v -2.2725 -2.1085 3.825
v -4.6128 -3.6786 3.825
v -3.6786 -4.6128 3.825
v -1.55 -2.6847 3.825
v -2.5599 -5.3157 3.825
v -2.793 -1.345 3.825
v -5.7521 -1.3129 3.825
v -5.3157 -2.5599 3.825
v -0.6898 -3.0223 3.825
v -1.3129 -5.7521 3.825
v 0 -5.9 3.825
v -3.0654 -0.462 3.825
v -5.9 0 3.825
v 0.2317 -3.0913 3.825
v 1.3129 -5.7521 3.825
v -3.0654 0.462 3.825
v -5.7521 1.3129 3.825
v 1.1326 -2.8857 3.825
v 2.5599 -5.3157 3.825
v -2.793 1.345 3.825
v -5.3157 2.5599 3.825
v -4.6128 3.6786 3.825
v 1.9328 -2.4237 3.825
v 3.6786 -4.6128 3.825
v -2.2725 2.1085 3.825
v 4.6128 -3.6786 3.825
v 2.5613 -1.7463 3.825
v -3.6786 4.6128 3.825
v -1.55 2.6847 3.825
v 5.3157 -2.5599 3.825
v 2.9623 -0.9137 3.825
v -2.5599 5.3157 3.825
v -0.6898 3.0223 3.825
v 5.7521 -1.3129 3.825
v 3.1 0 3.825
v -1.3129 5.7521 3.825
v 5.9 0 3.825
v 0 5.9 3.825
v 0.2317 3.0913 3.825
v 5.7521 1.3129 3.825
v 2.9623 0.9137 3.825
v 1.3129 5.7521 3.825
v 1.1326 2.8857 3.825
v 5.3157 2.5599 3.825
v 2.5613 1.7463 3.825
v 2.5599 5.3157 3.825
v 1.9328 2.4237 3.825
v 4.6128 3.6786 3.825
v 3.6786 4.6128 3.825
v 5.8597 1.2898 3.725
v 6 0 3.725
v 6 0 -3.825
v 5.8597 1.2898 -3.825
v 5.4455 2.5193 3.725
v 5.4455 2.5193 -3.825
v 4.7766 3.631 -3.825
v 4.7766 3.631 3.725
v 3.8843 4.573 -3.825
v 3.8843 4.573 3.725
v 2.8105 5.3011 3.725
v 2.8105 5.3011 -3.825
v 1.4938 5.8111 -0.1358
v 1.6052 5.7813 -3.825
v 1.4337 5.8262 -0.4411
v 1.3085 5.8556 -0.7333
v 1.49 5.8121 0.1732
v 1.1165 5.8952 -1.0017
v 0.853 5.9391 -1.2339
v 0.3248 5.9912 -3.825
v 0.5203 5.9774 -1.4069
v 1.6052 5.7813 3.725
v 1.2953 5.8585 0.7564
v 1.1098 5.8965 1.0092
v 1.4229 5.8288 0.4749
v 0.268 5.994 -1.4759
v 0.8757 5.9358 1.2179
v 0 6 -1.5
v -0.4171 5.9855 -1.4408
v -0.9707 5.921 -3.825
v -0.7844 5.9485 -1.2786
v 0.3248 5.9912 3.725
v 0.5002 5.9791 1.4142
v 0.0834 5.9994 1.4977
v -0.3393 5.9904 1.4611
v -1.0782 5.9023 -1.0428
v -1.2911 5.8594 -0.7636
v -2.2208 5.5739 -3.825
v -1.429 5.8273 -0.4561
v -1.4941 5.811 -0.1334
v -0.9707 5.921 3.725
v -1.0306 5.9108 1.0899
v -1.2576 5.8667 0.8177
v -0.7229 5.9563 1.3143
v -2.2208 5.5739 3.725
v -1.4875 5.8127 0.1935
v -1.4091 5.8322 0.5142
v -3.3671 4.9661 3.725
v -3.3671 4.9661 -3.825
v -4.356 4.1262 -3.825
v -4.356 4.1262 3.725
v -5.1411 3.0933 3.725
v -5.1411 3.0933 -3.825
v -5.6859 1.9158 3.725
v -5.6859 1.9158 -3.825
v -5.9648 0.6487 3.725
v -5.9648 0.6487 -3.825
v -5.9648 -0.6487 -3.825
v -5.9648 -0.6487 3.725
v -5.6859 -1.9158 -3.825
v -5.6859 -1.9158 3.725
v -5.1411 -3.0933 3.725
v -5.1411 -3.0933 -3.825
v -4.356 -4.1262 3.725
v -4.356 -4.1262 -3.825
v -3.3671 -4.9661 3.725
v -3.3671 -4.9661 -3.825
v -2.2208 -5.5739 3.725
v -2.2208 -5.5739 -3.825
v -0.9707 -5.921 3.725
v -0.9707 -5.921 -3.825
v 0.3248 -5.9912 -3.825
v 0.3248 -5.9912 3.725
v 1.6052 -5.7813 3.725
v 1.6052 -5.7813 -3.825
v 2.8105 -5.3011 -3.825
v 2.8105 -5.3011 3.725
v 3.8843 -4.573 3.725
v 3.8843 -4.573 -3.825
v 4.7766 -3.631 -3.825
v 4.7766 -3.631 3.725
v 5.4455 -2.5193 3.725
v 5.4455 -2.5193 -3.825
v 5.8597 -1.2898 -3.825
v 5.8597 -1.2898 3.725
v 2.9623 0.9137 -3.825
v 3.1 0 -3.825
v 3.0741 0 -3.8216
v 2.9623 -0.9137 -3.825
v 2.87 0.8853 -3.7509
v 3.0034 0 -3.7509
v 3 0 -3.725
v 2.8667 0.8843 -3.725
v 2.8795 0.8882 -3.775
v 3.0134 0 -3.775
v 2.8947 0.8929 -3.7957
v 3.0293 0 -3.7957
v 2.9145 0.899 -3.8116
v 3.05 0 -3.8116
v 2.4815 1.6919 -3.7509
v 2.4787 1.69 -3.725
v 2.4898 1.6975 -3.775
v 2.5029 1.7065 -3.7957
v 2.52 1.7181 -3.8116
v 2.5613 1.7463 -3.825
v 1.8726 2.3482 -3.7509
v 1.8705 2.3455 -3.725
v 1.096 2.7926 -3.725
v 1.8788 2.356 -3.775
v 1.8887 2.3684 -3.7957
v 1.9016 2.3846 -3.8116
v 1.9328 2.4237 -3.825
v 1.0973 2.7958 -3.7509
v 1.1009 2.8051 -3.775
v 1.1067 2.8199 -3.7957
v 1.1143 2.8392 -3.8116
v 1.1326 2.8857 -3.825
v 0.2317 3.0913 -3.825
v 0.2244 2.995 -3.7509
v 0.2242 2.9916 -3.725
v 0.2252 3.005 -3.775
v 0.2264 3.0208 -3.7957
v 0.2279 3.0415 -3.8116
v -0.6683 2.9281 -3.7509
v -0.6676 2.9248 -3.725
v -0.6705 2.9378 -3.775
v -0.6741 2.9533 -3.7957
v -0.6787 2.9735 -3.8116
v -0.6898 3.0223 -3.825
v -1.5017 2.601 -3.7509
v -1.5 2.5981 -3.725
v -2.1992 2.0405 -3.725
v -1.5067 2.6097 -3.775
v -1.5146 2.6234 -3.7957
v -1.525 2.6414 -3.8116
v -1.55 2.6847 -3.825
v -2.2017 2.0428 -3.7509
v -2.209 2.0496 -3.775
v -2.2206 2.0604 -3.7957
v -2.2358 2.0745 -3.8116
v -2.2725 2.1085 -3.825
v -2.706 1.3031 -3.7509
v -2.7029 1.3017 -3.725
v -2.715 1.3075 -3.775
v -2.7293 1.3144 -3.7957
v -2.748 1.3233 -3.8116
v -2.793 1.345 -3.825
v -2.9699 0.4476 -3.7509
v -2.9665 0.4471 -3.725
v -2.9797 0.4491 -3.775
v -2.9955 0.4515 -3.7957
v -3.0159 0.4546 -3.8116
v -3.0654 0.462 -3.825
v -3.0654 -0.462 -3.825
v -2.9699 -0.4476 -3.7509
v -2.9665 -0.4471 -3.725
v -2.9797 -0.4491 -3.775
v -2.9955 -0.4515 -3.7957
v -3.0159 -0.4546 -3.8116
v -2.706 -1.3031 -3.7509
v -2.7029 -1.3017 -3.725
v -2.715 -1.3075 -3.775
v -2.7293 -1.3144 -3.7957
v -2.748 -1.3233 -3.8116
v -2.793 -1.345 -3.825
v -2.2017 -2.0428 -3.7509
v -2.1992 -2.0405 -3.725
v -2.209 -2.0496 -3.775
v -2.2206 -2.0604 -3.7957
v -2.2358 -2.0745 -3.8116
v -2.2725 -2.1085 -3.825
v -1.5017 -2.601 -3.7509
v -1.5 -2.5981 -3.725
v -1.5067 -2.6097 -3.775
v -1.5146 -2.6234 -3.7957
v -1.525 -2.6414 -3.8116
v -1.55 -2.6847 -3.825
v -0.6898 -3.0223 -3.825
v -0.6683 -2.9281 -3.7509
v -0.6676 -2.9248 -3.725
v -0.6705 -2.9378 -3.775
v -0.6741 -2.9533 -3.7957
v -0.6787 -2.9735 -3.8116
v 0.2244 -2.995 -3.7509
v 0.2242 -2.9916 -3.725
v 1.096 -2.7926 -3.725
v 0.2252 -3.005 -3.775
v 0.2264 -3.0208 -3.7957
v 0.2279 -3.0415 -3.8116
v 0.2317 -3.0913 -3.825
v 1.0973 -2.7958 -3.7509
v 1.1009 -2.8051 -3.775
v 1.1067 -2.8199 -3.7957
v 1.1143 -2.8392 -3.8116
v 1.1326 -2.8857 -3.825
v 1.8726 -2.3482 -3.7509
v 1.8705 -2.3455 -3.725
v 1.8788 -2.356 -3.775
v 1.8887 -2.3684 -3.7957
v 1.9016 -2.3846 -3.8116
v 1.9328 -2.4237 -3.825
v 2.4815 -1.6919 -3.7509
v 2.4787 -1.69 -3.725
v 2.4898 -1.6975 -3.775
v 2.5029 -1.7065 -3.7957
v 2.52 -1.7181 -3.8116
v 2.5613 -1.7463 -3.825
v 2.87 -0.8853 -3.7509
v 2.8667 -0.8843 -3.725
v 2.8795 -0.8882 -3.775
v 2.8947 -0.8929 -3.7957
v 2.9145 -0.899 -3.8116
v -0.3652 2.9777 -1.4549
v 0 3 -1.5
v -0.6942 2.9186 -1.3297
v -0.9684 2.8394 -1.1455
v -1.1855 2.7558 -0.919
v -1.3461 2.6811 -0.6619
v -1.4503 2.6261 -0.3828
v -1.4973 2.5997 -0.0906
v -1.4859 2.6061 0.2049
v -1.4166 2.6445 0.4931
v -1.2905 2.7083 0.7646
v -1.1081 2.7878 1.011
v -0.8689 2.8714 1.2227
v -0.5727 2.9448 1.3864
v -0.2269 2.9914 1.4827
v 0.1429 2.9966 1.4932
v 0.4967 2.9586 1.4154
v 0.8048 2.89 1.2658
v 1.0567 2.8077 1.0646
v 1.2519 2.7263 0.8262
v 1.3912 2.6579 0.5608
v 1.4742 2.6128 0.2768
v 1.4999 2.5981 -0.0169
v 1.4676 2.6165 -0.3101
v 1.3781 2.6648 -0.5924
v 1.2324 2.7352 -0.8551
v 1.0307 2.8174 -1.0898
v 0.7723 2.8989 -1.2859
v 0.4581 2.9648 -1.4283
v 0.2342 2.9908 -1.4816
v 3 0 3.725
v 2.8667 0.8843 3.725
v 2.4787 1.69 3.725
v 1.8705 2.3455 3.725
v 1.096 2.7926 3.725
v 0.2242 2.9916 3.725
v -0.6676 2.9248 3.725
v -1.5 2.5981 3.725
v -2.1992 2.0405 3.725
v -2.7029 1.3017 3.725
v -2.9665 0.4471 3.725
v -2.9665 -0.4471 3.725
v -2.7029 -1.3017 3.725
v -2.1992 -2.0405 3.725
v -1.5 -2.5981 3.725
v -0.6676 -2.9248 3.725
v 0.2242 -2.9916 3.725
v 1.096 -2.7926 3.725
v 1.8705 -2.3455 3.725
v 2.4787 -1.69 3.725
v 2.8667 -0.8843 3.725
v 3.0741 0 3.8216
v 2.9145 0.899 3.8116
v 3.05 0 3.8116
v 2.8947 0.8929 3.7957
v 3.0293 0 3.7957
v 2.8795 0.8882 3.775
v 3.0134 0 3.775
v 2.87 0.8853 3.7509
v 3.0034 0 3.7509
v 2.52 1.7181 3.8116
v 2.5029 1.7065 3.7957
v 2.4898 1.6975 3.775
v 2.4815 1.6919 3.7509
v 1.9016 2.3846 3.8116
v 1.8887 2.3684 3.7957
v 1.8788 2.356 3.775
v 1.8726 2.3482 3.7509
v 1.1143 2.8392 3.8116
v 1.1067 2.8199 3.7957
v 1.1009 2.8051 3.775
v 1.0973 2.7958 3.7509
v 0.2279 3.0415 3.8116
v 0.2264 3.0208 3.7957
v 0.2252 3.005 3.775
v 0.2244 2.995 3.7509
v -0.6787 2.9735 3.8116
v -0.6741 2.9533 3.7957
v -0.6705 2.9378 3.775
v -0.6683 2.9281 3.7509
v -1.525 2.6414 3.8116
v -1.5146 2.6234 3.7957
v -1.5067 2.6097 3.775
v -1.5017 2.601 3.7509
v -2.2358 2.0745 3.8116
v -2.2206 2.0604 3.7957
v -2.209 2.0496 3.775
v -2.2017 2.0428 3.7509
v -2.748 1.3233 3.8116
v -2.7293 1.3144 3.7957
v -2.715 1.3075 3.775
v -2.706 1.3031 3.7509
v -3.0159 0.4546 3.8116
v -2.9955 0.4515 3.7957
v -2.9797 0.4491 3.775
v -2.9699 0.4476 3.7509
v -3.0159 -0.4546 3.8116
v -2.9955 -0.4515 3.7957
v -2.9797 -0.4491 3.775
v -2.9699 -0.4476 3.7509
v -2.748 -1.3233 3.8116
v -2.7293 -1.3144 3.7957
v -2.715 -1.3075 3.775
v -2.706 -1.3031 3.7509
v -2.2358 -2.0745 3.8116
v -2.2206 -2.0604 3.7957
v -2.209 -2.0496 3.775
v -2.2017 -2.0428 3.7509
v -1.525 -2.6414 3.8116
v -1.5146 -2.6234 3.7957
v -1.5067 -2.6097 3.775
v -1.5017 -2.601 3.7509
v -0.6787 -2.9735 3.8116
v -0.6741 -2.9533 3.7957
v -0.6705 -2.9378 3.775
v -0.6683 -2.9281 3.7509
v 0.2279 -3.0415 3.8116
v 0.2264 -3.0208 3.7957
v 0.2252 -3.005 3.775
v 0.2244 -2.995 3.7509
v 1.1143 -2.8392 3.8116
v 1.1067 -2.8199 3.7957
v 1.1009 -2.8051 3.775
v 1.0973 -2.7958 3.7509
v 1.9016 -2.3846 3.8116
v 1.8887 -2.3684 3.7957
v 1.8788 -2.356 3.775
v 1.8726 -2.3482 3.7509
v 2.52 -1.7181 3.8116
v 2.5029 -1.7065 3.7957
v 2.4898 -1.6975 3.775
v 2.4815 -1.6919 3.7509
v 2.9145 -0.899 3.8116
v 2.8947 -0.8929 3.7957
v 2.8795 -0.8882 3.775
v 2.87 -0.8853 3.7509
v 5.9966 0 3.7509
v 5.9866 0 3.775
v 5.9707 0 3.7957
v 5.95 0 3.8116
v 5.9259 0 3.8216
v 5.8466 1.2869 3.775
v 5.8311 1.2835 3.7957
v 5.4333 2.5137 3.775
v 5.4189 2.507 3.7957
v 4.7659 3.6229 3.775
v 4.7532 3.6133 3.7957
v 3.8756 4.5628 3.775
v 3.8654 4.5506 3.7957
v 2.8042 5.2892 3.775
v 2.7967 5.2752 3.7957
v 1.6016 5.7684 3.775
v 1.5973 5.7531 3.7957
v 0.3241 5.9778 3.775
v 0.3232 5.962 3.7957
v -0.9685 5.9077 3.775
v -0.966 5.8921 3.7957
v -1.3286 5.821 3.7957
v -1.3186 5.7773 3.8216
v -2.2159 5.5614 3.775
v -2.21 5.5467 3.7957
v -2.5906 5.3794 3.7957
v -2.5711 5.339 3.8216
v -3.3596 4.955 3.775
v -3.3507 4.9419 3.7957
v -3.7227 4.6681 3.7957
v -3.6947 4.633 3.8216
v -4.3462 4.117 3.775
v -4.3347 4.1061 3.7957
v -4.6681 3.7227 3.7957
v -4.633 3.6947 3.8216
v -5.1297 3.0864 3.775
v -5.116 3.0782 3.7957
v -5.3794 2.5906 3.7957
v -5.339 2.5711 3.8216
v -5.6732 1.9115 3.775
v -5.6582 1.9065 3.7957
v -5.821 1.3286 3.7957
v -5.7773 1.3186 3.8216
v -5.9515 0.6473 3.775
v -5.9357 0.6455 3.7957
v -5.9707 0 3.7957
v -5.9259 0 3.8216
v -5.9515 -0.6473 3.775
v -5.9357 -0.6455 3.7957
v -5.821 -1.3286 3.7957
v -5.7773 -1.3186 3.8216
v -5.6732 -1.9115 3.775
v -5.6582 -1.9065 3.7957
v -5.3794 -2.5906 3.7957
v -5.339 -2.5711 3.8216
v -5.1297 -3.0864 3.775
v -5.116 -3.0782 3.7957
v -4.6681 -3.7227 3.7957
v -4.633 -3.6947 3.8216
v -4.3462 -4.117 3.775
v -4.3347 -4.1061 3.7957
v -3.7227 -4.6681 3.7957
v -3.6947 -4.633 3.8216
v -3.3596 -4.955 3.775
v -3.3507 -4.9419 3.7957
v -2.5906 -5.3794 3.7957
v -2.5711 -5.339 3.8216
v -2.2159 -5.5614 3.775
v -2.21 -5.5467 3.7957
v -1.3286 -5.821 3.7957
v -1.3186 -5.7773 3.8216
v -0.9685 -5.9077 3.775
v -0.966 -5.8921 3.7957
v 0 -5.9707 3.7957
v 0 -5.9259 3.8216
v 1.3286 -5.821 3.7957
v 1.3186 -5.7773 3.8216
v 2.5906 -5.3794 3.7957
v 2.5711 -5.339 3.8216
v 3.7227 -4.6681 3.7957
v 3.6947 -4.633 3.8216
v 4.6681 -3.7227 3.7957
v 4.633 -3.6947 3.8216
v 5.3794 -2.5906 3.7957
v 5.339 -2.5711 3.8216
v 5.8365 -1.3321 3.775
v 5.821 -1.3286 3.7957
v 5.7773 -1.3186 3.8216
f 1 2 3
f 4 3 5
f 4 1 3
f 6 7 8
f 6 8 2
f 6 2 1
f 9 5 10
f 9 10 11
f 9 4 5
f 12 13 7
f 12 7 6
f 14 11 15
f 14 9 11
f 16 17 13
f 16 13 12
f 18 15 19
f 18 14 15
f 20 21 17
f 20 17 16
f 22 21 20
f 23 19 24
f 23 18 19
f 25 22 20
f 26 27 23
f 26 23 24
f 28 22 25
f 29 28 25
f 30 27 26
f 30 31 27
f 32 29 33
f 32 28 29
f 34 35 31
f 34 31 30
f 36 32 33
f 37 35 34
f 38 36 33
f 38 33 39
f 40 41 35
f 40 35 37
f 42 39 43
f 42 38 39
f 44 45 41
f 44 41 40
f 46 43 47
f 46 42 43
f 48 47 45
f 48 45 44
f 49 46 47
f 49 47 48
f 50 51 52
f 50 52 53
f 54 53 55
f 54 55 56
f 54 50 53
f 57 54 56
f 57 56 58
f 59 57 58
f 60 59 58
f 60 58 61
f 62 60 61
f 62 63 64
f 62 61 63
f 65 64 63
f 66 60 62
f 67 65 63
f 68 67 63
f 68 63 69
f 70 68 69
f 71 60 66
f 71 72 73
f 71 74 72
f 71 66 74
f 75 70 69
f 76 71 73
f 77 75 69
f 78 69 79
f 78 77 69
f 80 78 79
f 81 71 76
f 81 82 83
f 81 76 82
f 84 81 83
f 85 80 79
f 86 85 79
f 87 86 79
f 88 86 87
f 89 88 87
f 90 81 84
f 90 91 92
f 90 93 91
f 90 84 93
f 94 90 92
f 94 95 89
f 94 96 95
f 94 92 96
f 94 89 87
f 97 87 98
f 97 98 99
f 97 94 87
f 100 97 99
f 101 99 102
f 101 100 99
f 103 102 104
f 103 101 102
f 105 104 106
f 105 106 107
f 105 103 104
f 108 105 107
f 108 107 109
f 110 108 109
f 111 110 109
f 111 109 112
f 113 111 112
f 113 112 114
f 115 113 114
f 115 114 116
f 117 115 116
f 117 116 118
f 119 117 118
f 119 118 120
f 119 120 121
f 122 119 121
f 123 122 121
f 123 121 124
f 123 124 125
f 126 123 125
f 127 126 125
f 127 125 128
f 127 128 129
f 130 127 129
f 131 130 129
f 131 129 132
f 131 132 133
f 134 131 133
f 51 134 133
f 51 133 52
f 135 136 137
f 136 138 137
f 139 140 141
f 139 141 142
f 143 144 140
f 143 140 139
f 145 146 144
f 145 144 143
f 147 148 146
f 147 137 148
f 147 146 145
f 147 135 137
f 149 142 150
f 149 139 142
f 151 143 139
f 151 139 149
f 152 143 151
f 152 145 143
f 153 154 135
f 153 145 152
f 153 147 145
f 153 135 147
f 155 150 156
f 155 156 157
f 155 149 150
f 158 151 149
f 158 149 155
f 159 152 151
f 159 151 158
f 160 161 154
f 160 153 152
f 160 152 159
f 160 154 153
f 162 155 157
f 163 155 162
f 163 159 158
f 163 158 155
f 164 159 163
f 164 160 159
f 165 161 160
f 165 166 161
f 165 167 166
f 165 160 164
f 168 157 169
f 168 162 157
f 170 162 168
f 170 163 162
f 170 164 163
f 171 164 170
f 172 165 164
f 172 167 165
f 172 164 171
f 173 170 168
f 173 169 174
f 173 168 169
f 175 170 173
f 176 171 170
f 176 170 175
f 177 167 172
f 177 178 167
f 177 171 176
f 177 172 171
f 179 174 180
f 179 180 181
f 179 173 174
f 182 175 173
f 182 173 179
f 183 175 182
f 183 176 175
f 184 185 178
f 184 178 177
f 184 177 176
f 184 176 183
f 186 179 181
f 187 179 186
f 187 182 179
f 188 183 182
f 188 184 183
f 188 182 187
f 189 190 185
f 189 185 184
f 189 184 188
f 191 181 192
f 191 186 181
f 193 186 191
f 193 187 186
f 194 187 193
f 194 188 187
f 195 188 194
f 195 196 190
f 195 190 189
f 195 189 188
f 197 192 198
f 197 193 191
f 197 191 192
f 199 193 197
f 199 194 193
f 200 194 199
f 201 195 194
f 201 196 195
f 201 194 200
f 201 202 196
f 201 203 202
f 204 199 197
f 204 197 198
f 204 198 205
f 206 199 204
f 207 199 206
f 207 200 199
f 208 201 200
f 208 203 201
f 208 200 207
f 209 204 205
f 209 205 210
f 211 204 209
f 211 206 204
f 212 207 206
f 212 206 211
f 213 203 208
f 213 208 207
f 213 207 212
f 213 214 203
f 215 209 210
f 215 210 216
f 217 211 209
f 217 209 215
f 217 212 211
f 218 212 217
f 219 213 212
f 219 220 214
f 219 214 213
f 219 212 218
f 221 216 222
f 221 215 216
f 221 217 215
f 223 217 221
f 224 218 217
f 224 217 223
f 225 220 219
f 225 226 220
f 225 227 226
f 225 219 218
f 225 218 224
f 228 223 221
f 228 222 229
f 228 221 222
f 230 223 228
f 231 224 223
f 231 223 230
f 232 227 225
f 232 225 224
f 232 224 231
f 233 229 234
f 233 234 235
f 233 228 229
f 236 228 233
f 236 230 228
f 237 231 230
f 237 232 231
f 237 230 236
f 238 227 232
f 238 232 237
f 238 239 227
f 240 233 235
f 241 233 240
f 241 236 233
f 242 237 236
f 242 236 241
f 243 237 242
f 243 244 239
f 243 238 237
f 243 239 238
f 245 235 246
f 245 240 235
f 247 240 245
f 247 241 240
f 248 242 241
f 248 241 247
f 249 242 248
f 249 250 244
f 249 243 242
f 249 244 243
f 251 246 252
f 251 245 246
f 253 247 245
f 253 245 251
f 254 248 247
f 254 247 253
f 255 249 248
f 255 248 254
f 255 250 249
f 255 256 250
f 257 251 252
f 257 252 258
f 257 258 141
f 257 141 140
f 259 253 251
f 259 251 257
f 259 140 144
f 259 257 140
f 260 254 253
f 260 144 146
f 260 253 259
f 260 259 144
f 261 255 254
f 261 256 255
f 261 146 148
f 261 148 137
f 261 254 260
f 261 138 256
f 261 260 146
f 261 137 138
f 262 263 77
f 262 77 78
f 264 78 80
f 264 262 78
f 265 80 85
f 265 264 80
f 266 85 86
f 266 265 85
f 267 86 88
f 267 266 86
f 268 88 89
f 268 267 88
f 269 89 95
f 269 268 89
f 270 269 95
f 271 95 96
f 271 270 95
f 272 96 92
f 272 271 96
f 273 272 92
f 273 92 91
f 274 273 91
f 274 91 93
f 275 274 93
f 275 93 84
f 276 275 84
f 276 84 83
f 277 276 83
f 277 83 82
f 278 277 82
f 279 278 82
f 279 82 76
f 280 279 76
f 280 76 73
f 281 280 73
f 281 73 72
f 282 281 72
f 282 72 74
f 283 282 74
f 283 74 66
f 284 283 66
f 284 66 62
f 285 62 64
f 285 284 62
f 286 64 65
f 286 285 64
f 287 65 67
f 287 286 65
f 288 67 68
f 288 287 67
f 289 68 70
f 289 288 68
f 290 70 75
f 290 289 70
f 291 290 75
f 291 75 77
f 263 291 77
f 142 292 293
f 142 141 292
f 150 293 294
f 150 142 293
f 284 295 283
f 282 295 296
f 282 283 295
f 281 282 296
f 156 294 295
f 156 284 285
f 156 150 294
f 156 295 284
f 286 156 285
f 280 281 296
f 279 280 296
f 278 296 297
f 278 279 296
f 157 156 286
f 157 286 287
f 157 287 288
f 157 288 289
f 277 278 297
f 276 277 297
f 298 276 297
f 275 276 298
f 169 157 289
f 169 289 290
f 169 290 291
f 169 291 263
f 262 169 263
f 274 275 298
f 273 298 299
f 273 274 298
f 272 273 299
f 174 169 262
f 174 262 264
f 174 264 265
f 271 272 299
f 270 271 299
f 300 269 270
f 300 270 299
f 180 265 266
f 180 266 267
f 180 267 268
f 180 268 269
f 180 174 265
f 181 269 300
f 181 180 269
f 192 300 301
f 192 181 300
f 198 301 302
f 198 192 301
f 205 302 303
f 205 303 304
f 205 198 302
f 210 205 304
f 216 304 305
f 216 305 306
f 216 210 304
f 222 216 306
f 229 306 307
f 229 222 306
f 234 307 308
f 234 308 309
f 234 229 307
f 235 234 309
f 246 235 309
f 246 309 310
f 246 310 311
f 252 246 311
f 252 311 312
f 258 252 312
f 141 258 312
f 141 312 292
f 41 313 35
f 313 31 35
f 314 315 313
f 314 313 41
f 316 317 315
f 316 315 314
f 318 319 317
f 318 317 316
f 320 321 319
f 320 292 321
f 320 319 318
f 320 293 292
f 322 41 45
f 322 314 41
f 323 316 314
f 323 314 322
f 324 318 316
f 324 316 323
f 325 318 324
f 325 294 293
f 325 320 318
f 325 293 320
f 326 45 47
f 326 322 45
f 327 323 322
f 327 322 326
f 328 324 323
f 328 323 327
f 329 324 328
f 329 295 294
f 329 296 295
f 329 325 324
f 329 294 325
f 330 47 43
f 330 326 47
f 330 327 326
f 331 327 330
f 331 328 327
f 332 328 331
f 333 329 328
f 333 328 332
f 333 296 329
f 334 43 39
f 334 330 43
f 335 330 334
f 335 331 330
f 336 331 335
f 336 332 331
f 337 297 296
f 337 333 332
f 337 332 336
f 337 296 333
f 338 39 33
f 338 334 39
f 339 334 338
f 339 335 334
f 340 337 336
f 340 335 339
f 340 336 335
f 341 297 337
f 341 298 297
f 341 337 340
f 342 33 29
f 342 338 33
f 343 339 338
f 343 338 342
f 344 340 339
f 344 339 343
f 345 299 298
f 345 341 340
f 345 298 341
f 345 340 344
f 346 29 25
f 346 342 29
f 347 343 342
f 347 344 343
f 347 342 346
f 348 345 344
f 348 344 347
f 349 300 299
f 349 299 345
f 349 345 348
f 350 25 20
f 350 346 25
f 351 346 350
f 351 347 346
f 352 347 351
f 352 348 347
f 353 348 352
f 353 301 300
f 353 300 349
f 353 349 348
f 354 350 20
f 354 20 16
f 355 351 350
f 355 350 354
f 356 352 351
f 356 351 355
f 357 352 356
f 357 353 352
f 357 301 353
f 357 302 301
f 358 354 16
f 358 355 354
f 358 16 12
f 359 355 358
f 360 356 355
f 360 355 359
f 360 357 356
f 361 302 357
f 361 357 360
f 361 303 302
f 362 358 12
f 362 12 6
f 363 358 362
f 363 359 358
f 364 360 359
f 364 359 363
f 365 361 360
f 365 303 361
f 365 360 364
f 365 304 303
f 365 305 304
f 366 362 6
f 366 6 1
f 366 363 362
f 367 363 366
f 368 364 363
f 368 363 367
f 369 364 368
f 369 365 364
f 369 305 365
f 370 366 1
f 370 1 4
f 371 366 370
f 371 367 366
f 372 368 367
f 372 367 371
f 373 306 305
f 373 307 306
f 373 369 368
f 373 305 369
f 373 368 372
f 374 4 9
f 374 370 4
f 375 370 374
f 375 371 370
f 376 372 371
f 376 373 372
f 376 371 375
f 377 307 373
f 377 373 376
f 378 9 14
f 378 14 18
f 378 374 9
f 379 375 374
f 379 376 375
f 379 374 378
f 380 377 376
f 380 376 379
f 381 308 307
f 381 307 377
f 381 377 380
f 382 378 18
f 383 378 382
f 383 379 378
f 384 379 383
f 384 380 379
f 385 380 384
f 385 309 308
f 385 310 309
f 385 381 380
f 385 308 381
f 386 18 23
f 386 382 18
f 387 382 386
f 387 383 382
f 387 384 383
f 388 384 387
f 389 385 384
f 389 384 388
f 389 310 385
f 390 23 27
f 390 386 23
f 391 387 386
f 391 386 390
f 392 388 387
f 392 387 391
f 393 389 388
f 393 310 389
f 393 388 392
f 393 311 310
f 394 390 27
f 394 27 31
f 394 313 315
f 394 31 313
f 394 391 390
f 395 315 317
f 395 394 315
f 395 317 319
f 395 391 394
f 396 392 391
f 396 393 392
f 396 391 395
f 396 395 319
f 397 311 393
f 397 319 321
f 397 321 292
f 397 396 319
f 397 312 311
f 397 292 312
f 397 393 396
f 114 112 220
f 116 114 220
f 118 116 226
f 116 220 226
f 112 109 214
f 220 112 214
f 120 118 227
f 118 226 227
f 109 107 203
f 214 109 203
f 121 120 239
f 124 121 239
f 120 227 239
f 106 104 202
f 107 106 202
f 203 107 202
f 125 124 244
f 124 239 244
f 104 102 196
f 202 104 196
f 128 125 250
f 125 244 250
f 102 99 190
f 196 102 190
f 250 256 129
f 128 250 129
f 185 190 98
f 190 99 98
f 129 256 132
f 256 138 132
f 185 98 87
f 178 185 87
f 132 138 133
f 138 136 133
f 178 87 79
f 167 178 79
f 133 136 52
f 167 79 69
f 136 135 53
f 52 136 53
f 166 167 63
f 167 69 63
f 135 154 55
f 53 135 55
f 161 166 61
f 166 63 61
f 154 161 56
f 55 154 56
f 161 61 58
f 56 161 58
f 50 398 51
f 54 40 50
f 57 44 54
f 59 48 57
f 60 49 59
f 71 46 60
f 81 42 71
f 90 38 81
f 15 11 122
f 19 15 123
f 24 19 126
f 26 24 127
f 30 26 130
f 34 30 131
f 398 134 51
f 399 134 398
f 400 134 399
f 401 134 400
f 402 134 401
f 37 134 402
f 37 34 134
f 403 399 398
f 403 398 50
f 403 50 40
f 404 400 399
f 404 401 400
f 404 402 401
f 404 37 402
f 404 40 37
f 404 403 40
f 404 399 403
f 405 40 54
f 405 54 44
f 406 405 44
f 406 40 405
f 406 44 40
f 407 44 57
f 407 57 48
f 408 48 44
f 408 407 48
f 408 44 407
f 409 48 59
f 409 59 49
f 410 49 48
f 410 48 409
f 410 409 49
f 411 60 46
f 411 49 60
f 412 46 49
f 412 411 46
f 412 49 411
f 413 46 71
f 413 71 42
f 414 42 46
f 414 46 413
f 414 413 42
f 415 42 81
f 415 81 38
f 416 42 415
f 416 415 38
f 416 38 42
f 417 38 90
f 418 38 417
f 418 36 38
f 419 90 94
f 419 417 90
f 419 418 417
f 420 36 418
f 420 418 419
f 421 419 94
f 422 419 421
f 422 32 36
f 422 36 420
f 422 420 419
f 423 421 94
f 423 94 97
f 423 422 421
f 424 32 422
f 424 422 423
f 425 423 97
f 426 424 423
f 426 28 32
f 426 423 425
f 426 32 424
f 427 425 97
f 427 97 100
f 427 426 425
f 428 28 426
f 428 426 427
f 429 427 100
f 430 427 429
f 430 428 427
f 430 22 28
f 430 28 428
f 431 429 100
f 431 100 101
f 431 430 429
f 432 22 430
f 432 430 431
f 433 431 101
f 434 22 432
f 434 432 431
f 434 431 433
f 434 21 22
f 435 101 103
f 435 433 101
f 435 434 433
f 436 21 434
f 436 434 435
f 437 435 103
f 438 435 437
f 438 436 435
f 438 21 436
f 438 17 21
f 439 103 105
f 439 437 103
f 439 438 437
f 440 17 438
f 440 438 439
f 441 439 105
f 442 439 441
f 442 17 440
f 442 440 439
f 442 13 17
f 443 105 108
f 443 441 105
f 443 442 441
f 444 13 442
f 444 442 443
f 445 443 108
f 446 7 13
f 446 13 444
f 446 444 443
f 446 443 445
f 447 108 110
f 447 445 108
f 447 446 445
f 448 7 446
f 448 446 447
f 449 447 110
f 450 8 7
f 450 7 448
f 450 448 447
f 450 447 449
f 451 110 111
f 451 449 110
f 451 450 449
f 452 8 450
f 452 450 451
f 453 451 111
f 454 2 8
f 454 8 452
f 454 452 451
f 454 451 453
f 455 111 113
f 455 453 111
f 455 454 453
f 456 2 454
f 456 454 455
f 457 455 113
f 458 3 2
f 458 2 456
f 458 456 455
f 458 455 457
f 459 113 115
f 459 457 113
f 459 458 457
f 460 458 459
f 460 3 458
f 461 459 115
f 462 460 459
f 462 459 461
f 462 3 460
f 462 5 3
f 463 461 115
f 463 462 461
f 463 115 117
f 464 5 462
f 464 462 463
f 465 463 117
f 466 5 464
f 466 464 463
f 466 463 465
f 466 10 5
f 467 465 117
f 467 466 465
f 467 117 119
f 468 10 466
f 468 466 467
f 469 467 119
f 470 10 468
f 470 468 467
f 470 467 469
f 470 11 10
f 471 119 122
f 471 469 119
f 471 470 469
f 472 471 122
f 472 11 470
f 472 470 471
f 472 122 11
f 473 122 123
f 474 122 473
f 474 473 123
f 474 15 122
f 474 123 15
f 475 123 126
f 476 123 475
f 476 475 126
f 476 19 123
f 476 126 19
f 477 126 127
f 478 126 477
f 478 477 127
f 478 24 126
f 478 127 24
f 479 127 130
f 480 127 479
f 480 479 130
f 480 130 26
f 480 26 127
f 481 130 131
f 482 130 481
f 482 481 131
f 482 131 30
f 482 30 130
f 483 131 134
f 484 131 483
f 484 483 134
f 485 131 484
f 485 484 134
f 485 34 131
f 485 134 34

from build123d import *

# Parameters (mm, degrees)
SKETCH_1_R          = 6
SKETCH_1_R_2        = 3
EXTRUDE_1_DEPTH     = 3.825
FILLET_1_R          = 0.1
SKETCH_2_R          = 1.5
CUT_EXTRUDE_1_DEPTH = 7.65


with BuildPart() as part:
    # 草圖1 → 填料-伸長1 (new, symmetric)
    with BuildSketch(Plane.XY):
        Circle(SKETCH_1_R)
        Circle(SKETCH_1_R_2, mode=Mode.SUBTRACT)
    extrude(amount=EXTRUDE_1_DEPTH, both=True)

    # 圓角1
    fillet_1_edges = [part.edges().sort_by_distance(p)[0] for p in [
        (-6, 0, 3.825),
        (-3, 0, -3.825),
        (-3, 0, 3.825),
    ]]
    fillet(fillet_1_edges, radius=FILLET_1_R)

    # 草圖2 → 除料-伸長1 (cut)
    with BuildSketch(Plane(origin=(0, 0, 0), x_dir=(1, 0, 0), z_dir=(0, 1, 0))):
        with Locations(Location((0, 0, 0), (0, 0, 90))):
            Circle(SKETCH_2_R)
    extrude(amount=CUT_EXTRUDE_1_DEPTH, mode=Mode.SUBTRACT)


solid = part.part
